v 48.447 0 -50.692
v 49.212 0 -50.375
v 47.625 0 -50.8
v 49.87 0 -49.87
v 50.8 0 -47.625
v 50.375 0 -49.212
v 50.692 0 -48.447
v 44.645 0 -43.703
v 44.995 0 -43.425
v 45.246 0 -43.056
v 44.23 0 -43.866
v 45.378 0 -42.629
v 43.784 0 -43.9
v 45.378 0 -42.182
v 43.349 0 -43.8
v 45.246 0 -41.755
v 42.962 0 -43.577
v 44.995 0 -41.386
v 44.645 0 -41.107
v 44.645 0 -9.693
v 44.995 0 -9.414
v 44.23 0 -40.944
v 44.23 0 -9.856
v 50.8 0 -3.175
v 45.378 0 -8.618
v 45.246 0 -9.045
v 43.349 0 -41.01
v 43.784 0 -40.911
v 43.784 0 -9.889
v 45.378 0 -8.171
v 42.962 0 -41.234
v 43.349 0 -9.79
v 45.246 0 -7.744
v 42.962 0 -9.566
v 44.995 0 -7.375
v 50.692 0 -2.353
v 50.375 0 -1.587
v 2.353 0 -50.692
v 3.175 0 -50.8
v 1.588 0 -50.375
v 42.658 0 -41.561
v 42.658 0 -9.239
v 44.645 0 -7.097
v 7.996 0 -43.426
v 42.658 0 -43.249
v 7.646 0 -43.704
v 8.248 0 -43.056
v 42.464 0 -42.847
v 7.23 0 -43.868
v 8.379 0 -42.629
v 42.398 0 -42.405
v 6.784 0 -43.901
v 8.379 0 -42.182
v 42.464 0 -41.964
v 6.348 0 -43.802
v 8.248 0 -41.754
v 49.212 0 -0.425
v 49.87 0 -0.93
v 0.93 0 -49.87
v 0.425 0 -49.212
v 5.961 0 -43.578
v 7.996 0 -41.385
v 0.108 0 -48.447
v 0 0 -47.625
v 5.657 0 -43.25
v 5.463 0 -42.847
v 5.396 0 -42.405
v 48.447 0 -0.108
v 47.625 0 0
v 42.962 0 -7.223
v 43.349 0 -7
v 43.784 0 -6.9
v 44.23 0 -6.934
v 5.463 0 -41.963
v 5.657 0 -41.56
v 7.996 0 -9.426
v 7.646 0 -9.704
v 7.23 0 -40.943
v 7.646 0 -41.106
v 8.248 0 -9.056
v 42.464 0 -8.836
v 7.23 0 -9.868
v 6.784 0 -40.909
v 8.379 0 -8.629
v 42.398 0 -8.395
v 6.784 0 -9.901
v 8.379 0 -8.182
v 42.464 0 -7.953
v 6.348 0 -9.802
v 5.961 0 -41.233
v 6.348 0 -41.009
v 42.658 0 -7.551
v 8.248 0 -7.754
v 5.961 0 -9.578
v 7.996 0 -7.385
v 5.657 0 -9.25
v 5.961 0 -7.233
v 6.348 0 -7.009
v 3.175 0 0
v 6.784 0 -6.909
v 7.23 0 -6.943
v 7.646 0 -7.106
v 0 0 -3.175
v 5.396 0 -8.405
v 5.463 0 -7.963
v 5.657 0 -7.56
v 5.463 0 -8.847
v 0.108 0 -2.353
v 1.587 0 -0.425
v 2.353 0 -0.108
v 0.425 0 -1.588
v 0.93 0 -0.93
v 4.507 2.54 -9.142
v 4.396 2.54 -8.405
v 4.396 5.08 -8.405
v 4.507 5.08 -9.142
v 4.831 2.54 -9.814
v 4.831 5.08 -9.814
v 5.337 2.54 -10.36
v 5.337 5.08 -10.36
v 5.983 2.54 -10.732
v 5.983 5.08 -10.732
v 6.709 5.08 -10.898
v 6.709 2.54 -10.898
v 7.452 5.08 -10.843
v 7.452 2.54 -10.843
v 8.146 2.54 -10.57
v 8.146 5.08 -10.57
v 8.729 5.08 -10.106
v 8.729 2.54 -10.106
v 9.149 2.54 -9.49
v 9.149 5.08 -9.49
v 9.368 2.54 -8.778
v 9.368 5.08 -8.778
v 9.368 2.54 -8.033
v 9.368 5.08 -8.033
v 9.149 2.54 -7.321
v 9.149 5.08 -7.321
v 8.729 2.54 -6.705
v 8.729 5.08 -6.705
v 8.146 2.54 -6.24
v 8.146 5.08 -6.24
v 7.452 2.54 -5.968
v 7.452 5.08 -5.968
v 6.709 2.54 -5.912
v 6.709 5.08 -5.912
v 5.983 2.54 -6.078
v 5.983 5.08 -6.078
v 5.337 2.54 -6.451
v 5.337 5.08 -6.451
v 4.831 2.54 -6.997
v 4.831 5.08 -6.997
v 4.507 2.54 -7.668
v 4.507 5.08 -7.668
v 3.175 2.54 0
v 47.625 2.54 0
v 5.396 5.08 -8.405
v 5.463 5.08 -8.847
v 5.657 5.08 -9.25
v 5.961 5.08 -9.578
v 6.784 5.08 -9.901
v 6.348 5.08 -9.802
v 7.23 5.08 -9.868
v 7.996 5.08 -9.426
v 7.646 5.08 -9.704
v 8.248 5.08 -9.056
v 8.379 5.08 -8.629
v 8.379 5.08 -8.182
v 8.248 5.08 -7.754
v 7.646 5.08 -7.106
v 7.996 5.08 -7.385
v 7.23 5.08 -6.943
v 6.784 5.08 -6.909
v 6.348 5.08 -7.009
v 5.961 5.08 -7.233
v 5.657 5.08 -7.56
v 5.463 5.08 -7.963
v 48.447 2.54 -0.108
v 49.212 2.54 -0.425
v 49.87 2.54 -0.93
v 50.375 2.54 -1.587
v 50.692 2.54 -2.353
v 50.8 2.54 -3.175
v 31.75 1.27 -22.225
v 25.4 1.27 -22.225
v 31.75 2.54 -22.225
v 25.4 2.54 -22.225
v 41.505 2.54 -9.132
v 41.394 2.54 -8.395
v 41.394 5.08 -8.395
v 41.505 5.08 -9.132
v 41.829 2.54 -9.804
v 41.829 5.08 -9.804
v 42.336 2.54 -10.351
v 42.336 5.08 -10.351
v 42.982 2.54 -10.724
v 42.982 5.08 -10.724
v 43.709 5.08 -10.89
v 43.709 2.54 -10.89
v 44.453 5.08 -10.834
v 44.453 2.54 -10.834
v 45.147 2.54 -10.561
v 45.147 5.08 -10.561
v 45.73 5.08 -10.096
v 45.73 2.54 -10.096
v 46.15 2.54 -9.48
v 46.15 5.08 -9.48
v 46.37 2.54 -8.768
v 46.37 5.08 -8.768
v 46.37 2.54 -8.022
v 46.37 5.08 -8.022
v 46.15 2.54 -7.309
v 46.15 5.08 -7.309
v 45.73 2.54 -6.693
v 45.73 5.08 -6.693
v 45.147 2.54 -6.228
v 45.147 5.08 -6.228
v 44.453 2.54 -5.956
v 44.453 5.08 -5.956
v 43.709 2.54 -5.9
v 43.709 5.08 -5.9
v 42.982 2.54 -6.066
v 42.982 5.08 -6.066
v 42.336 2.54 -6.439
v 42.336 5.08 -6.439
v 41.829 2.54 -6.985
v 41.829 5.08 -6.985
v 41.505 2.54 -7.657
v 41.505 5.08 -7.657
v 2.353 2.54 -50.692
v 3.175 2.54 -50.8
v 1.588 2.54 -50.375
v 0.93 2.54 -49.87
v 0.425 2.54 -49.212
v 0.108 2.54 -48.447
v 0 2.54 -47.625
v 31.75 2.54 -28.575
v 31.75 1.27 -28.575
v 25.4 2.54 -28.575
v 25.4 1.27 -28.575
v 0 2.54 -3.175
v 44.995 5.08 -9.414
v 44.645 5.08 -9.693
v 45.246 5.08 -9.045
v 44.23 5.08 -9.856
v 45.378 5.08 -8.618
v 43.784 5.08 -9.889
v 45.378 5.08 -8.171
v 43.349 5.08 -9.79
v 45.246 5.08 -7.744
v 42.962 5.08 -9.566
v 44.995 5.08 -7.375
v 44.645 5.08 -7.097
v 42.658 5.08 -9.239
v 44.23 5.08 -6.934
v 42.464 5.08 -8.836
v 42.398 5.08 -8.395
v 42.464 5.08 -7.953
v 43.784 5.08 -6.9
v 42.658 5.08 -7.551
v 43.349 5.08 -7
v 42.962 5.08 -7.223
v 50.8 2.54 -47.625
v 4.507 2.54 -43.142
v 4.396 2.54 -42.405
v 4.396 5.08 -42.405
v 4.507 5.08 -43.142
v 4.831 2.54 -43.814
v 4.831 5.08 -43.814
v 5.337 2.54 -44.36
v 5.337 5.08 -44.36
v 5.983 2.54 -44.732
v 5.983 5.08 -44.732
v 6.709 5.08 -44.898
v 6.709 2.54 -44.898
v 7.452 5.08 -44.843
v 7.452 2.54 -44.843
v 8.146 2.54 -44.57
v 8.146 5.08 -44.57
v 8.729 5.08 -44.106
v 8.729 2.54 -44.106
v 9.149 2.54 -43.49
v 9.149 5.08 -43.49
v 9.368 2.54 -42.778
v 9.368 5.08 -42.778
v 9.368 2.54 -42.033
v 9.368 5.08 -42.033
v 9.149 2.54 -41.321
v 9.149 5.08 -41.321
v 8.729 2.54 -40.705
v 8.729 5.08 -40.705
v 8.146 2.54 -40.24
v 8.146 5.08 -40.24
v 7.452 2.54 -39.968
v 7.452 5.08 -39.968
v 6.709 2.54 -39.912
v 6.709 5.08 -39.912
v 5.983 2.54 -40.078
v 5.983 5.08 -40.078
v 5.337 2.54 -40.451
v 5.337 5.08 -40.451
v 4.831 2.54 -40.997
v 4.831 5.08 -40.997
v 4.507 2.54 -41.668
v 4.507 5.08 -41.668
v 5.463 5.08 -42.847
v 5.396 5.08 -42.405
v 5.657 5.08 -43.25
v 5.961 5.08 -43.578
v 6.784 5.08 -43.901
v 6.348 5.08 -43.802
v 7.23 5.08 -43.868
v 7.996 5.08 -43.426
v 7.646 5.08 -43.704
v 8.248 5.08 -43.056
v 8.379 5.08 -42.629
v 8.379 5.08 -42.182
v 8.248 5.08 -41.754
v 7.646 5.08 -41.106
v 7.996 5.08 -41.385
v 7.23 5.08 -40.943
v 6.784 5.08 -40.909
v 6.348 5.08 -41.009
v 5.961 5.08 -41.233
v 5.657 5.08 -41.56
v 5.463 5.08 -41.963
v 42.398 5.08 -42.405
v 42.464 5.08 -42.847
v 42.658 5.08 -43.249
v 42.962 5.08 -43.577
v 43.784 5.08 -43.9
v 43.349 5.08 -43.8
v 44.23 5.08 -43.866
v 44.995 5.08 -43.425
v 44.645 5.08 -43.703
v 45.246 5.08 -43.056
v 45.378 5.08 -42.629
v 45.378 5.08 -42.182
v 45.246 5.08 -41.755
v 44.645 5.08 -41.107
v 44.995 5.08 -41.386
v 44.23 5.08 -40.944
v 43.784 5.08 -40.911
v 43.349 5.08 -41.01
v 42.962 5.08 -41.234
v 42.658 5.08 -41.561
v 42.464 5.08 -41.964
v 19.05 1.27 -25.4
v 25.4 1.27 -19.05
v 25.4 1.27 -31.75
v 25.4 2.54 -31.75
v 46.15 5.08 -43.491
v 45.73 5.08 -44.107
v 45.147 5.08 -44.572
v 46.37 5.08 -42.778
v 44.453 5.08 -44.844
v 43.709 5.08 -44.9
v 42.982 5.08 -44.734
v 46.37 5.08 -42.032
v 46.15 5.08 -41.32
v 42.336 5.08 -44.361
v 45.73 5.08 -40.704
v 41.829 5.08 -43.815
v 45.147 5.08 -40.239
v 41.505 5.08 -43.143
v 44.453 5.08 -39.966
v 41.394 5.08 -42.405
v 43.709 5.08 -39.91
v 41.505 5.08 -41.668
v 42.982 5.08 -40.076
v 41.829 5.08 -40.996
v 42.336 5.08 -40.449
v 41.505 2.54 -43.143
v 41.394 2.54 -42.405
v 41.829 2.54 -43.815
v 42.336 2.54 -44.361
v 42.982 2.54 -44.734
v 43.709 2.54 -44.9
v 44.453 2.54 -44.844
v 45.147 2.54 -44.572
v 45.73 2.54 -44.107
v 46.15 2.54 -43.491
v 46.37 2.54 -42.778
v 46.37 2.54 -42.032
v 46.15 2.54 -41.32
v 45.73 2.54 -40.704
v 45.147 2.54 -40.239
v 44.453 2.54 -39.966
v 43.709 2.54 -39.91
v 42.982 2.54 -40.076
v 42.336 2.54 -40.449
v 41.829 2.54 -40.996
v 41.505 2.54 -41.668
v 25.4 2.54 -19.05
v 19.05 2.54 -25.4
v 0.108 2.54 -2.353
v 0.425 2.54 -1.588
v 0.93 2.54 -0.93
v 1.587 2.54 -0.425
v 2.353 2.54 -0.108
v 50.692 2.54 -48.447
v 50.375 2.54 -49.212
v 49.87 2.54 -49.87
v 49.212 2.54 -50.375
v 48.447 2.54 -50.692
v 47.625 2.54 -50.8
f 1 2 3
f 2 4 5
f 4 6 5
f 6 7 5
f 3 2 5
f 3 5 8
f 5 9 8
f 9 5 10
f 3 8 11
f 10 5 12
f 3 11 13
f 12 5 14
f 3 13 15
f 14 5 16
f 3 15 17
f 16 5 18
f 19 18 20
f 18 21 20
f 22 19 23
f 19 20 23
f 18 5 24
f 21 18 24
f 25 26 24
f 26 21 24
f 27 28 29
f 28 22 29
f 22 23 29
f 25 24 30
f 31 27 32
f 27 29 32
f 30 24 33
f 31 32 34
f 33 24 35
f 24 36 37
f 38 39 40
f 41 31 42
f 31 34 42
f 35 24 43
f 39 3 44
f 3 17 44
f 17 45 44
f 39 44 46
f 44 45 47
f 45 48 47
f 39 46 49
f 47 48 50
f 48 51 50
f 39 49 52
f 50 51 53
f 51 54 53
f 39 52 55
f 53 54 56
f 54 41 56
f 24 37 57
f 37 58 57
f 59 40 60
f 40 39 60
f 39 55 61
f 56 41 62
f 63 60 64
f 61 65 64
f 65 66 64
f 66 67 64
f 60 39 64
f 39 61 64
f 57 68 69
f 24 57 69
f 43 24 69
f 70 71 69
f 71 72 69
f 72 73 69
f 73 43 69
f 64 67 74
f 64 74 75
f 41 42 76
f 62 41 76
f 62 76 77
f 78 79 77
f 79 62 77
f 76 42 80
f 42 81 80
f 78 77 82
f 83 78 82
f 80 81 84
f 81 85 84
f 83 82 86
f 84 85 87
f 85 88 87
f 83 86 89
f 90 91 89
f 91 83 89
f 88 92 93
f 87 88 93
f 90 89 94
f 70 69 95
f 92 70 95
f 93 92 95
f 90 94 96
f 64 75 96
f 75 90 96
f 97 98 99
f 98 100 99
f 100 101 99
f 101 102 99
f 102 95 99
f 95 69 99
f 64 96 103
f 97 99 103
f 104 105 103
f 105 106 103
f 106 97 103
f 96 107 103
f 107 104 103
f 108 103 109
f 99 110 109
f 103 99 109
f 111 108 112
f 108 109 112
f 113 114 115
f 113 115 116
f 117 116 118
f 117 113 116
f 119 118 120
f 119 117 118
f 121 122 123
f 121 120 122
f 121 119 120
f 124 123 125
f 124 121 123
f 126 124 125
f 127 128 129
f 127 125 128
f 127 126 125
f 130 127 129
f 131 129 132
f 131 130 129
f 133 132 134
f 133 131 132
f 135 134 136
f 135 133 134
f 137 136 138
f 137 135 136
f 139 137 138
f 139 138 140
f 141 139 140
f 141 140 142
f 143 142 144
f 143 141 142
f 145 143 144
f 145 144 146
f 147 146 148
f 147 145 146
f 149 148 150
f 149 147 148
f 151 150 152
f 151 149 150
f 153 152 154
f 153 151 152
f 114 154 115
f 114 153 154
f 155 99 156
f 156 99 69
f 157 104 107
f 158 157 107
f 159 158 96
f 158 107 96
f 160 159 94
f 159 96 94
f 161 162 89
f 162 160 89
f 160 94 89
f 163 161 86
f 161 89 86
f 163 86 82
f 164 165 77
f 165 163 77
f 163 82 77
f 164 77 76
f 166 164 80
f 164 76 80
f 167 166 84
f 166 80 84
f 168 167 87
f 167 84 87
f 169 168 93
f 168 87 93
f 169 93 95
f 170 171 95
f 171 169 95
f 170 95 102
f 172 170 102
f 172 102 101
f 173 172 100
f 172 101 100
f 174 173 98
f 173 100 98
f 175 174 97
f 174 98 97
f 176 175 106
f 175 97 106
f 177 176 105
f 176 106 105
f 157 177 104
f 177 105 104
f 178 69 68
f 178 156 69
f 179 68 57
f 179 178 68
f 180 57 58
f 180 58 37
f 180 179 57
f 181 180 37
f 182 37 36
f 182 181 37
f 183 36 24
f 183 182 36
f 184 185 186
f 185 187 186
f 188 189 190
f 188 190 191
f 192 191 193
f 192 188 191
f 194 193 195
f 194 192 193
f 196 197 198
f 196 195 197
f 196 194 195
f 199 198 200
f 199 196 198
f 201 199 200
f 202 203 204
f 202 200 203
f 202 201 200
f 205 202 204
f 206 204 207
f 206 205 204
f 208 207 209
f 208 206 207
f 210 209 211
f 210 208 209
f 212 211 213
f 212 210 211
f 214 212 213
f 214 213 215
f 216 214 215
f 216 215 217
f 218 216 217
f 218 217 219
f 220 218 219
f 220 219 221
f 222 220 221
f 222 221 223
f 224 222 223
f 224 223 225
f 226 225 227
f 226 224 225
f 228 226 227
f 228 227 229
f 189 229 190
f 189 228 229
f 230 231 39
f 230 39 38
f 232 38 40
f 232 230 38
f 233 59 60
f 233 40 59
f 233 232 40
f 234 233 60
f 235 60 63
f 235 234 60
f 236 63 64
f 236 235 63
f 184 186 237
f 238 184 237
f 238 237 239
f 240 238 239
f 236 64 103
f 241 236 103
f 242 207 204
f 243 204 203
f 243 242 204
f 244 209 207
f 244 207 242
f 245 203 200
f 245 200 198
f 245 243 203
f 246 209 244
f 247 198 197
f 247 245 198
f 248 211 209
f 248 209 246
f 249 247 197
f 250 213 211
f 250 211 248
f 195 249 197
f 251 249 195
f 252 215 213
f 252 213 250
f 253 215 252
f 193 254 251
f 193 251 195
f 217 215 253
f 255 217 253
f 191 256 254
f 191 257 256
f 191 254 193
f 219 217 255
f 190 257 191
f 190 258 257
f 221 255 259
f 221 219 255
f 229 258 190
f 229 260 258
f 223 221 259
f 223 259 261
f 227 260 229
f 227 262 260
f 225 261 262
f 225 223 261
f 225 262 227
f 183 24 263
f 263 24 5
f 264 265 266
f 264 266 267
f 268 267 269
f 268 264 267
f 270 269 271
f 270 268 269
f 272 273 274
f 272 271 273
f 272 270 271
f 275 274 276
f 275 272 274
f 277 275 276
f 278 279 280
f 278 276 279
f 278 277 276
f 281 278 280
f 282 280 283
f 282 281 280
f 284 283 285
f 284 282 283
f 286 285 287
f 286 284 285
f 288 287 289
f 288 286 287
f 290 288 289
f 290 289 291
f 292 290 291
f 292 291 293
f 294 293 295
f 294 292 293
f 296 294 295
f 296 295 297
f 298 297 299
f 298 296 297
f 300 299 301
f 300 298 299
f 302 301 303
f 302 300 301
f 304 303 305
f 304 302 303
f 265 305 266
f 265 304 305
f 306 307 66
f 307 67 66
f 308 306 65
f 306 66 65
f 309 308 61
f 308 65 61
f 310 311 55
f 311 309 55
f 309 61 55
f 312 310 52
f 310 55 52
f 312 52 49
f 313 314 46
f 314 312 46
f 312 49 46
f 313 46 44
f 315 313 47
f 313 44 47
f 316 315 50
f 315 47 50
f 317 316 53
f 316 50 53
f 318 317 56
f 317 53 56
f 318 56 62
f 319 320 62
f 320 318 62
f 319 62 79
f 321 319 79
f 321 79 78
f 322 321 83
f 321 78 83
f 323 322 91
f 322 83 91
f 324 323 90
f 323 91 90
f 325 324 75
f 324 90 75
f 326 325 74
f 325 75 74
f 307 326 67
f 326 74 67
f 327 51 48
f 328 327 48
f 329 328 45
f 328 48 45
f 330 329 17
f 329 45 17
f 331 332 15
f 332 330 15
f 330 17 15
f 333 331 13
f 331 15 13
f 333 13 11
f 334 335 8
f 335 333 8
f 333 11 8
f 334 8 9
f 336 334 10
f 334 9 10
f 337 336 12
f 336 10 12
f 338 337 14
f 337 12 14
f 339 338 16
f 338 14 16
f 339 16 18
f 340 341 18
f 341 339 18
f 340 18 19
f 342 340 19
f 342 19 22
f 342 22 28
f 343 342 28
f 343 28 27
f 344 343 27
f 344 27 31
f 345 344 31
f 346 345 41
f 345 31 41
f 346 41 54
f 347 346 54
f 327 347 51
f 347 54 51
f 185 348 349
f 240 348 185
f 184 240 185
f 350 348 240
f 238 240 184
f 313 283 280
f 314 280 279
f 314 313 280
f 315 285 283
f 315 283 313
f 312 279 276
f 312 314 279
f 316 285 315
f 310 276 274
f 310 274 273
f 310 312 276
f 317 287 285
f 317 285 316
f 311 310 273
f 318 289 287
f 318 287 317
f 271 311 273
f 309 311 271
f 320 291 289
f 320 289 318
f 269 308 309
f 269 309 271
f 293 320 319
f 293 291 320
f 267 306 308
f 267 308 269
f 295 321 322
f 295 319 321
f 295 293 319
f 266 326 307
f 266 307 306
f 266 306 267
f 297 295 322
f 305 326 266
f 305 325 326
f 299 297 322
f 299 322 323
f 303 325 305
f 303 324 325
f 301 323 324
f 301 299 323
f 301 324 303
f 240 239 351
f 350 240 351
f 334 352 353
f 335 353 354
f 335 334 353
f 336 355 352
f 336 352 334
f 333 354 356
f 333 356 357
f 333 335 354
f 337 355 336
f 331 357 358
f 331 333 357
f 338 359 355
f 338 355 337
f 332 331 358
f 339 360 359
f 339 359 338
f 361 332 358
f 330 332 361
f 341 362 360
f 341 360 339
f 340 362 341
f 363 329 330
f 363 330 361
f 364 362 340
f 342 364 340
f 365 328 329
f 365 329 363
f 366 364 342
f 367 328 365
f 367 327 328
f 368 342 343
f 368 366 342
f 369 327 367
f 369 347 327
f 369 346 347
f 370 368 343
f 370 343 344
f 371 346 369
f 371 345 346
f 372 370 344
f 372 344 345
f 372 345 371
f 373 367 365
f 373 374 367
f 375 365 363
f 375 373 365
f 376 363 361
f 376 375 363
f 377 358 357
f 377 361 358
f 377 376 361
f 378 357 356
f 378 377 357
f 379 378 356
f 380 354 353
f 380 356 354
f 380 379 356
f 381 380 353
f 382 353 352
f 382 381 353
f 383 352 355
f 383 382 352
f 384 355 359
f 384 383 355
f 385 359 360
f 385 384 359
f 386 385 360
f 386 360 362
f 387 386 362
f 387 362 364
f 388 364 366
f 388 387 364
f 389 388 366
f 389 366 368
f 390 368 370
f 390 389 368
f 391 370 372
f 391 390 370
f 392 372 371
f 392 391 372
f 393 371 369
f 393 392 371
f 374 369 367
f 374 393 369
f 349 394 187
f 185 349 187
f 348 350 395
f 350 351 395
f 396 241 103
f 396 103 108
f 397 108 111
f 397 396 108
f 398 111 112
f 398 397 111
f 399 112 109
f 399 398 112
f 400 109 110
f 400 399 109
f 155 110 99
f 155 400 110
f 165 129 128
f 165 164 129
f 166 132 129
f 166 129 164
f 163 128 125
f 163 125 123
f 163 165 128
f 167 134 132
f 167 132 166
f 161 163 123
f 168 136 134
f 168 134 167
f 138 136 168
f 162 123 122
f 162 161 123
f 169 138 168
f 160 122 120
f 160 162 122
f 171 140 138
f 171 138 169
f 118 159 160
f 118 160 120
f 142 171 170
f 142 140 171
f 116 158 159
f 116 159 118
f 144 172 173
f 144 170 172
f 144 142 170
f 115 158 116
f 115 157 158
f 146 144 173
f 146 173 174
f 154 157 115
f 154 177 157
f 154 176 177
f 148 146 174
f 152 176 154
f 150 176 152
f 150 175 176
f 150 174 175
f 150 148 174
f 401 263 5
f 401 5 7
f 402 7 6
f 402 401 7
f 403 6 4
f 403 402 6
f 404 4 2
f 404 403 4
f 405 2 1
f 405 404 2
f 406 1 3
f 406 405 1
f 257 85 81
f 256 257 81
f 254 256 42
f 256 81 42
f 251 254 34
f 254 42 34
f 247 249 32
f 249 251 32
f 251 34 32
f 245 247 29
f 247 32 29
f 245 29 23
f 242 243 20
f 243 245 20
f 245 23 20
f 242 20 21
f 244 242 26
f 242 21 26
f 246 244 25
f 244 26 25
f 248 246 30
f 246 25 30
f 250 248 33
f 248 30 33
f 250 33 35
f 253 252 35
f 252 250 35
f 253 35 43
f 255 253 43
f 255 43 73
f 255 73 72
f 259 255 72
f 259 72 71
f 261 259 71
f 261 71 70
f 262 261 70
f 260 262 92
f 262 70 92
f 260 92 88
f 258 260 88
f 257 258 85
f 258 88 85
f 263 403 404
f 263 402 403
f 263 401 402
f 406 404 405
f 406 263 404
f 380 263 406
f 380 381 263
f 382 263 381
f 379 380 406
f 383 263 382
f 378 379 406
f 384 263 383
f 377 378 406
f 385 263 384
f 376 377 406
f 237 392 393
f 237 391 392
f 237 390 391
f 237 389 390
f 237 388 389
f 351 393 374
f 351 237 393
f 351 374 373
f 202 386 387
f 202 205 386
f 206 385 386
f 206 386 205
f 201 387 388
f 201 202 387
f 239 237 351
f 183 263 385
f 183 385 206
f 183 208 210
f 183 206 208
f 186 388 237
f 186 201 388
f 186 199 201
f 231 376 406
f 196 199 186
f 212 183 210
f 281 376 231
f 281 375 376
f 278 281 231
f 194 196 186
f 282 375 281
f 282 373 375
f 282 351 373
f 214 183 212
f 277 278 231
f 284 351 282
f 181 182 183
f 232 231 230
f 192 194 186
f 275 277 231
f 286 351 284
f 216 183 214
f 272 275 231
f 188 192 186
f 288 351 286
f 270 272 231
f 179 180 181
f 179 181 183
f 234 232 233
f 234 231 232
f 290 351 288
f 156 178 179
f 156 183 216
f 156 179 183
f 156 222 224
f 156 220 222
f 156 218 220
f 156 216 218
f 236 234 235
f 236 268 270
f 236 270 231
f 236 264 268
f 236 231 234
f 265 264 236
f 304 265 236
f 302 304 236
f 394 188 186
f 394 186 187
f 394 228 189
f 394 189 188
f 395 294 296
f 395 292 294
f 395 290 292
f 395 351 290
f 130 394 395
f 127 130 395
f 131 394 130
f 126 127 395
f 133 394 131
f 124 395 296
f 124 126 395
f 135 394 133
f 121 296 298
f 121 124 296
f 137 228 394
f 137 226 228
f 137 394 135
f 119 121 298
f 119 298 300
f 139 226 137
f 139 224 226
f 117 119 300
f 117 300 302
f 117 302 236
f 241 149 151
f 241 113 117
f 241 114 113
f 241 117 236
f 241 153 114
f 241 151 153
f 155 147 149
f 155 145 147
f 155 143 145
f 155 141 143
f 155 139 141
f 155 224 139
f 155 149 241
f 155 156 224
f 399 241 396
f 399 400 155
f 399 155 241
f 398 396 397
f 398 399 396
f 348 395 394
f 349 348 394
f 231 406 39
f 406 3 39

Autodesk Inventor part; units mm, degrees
ref_plane "YZ Plane" through (0, 0, 0) normal (1, 0, 0) x (0, 1, 0)
ref_plane "XZ Plane" through (0, 0, 0) normal (0, 1, 0) x (-1, 0, 0)
ref_plane "XY Plane" through (0, 0, 0) normal (0, 0, 1) x (1, 0, 0)
sketch "Sketch1" plane through (0, 0, 0) normal (0, 1, 0) x (-1, 0, 0)
  line L0 (0, 0) -> (-50.8, 0)
  line L1 (-50.8, 0) -> (-50.8, -50.8)
  line L2 (-50.8, -50.8) -> (0, -50.8)
  line L3 (0, -50.8) -> (0, 0)
  circle A0 centre (-6.8961, -8.4053) radius 1.5
  circle A1 centre (-6.8961, -42.4053) radius 1.5
  circle A2 centre (-6.8961, -42.4053) radius 2.5
  circle A3 centre (-6.8961, -8.4053) radius 2.5
  circle A4 centre (-43.8961, -8.3947) radius 1.4986
  circle A5 centre (-43.8961, -42.4053) radius 1.4986
  circle A6 centre (-43.8961, -42.4053) radius 2.5019
  circle A7 centre (-43.8961, -8.3947) radius 2.5019
  dimension "d9" = 50.8
  dimension "d10" = 50.8
  dimension "d11" = 3
  dimension "d12" = 3
  dimension "d13" = 34
  dimension "d14" = 5
  dimension "d15" = 5
  dimension "d16" = 8.3947
  dimension "d17" = 2.9972
  dimension "d18" = 2.9972
  dimension "d19" = 5.0038
  dimension "d20" = 5.0038
  dimension "d21" = 34.0106
  dimension "d22" = 37
  dimension "d23" = 37
  dimension "d24" = 6.8961
extrude "Extrusion1" add sketch "Sketch1" along normal blind 2.54 contours L3 L2 L1 L0
extrude "Extrusion2" add sketch "Sketch1" along normal blind 5.08 contours A2 | A3 | A6 | A7
fillet "Fillet1" radius 3.175 4 edges at (0, 1.27, -50.8) (50.8, 1.27, -50.8) (50.8, 1.27, 0) (0, 1.27, 0)
sketch "Sketch3" plane through (0, 2.54, 0) normal (0, 1, 0) x (1, 0, 0)
  line L0 (25.4, 22.225) -> (31.75, 22.225)
  line L1 (31.75, 22.225) -> (31.75, 28.575)
  line L2 (31.75, 28.575) -> (25.4, 28.575)
  line L3 (25.4, 28.575) -> (25.4, 31.75)
  line L4 (25.4, 31.75) -> (19.05, 25.4)
  line L5 (19.05, 25.4) -> (25.4, 19.05)
  line L6 (25.4, 19.05) -> (25.4, 22.225)
  line L7 (47.625, 50.8) -> (3.175, 50.8) projected
  line L8 (0, 47.625) -> (0, 3.175) projected
  point P0 (0, 0)
  point P1 (25.4, 20.6375)
  dimension "d40" = 6.35
  dimension "d41" = 6.35
  dimension "d42" = 6.35
  dimension "d43" = 3.175
  dimension "d44" = 45
  dimension "d45" = 22.225
  dimension "d47" = 6.35
  dimension "d48" = 19.05
extrude "Extrusion4" cut sketch "Sketch3" against normal blind 1.27
properties part number "Pump Jig V1"
